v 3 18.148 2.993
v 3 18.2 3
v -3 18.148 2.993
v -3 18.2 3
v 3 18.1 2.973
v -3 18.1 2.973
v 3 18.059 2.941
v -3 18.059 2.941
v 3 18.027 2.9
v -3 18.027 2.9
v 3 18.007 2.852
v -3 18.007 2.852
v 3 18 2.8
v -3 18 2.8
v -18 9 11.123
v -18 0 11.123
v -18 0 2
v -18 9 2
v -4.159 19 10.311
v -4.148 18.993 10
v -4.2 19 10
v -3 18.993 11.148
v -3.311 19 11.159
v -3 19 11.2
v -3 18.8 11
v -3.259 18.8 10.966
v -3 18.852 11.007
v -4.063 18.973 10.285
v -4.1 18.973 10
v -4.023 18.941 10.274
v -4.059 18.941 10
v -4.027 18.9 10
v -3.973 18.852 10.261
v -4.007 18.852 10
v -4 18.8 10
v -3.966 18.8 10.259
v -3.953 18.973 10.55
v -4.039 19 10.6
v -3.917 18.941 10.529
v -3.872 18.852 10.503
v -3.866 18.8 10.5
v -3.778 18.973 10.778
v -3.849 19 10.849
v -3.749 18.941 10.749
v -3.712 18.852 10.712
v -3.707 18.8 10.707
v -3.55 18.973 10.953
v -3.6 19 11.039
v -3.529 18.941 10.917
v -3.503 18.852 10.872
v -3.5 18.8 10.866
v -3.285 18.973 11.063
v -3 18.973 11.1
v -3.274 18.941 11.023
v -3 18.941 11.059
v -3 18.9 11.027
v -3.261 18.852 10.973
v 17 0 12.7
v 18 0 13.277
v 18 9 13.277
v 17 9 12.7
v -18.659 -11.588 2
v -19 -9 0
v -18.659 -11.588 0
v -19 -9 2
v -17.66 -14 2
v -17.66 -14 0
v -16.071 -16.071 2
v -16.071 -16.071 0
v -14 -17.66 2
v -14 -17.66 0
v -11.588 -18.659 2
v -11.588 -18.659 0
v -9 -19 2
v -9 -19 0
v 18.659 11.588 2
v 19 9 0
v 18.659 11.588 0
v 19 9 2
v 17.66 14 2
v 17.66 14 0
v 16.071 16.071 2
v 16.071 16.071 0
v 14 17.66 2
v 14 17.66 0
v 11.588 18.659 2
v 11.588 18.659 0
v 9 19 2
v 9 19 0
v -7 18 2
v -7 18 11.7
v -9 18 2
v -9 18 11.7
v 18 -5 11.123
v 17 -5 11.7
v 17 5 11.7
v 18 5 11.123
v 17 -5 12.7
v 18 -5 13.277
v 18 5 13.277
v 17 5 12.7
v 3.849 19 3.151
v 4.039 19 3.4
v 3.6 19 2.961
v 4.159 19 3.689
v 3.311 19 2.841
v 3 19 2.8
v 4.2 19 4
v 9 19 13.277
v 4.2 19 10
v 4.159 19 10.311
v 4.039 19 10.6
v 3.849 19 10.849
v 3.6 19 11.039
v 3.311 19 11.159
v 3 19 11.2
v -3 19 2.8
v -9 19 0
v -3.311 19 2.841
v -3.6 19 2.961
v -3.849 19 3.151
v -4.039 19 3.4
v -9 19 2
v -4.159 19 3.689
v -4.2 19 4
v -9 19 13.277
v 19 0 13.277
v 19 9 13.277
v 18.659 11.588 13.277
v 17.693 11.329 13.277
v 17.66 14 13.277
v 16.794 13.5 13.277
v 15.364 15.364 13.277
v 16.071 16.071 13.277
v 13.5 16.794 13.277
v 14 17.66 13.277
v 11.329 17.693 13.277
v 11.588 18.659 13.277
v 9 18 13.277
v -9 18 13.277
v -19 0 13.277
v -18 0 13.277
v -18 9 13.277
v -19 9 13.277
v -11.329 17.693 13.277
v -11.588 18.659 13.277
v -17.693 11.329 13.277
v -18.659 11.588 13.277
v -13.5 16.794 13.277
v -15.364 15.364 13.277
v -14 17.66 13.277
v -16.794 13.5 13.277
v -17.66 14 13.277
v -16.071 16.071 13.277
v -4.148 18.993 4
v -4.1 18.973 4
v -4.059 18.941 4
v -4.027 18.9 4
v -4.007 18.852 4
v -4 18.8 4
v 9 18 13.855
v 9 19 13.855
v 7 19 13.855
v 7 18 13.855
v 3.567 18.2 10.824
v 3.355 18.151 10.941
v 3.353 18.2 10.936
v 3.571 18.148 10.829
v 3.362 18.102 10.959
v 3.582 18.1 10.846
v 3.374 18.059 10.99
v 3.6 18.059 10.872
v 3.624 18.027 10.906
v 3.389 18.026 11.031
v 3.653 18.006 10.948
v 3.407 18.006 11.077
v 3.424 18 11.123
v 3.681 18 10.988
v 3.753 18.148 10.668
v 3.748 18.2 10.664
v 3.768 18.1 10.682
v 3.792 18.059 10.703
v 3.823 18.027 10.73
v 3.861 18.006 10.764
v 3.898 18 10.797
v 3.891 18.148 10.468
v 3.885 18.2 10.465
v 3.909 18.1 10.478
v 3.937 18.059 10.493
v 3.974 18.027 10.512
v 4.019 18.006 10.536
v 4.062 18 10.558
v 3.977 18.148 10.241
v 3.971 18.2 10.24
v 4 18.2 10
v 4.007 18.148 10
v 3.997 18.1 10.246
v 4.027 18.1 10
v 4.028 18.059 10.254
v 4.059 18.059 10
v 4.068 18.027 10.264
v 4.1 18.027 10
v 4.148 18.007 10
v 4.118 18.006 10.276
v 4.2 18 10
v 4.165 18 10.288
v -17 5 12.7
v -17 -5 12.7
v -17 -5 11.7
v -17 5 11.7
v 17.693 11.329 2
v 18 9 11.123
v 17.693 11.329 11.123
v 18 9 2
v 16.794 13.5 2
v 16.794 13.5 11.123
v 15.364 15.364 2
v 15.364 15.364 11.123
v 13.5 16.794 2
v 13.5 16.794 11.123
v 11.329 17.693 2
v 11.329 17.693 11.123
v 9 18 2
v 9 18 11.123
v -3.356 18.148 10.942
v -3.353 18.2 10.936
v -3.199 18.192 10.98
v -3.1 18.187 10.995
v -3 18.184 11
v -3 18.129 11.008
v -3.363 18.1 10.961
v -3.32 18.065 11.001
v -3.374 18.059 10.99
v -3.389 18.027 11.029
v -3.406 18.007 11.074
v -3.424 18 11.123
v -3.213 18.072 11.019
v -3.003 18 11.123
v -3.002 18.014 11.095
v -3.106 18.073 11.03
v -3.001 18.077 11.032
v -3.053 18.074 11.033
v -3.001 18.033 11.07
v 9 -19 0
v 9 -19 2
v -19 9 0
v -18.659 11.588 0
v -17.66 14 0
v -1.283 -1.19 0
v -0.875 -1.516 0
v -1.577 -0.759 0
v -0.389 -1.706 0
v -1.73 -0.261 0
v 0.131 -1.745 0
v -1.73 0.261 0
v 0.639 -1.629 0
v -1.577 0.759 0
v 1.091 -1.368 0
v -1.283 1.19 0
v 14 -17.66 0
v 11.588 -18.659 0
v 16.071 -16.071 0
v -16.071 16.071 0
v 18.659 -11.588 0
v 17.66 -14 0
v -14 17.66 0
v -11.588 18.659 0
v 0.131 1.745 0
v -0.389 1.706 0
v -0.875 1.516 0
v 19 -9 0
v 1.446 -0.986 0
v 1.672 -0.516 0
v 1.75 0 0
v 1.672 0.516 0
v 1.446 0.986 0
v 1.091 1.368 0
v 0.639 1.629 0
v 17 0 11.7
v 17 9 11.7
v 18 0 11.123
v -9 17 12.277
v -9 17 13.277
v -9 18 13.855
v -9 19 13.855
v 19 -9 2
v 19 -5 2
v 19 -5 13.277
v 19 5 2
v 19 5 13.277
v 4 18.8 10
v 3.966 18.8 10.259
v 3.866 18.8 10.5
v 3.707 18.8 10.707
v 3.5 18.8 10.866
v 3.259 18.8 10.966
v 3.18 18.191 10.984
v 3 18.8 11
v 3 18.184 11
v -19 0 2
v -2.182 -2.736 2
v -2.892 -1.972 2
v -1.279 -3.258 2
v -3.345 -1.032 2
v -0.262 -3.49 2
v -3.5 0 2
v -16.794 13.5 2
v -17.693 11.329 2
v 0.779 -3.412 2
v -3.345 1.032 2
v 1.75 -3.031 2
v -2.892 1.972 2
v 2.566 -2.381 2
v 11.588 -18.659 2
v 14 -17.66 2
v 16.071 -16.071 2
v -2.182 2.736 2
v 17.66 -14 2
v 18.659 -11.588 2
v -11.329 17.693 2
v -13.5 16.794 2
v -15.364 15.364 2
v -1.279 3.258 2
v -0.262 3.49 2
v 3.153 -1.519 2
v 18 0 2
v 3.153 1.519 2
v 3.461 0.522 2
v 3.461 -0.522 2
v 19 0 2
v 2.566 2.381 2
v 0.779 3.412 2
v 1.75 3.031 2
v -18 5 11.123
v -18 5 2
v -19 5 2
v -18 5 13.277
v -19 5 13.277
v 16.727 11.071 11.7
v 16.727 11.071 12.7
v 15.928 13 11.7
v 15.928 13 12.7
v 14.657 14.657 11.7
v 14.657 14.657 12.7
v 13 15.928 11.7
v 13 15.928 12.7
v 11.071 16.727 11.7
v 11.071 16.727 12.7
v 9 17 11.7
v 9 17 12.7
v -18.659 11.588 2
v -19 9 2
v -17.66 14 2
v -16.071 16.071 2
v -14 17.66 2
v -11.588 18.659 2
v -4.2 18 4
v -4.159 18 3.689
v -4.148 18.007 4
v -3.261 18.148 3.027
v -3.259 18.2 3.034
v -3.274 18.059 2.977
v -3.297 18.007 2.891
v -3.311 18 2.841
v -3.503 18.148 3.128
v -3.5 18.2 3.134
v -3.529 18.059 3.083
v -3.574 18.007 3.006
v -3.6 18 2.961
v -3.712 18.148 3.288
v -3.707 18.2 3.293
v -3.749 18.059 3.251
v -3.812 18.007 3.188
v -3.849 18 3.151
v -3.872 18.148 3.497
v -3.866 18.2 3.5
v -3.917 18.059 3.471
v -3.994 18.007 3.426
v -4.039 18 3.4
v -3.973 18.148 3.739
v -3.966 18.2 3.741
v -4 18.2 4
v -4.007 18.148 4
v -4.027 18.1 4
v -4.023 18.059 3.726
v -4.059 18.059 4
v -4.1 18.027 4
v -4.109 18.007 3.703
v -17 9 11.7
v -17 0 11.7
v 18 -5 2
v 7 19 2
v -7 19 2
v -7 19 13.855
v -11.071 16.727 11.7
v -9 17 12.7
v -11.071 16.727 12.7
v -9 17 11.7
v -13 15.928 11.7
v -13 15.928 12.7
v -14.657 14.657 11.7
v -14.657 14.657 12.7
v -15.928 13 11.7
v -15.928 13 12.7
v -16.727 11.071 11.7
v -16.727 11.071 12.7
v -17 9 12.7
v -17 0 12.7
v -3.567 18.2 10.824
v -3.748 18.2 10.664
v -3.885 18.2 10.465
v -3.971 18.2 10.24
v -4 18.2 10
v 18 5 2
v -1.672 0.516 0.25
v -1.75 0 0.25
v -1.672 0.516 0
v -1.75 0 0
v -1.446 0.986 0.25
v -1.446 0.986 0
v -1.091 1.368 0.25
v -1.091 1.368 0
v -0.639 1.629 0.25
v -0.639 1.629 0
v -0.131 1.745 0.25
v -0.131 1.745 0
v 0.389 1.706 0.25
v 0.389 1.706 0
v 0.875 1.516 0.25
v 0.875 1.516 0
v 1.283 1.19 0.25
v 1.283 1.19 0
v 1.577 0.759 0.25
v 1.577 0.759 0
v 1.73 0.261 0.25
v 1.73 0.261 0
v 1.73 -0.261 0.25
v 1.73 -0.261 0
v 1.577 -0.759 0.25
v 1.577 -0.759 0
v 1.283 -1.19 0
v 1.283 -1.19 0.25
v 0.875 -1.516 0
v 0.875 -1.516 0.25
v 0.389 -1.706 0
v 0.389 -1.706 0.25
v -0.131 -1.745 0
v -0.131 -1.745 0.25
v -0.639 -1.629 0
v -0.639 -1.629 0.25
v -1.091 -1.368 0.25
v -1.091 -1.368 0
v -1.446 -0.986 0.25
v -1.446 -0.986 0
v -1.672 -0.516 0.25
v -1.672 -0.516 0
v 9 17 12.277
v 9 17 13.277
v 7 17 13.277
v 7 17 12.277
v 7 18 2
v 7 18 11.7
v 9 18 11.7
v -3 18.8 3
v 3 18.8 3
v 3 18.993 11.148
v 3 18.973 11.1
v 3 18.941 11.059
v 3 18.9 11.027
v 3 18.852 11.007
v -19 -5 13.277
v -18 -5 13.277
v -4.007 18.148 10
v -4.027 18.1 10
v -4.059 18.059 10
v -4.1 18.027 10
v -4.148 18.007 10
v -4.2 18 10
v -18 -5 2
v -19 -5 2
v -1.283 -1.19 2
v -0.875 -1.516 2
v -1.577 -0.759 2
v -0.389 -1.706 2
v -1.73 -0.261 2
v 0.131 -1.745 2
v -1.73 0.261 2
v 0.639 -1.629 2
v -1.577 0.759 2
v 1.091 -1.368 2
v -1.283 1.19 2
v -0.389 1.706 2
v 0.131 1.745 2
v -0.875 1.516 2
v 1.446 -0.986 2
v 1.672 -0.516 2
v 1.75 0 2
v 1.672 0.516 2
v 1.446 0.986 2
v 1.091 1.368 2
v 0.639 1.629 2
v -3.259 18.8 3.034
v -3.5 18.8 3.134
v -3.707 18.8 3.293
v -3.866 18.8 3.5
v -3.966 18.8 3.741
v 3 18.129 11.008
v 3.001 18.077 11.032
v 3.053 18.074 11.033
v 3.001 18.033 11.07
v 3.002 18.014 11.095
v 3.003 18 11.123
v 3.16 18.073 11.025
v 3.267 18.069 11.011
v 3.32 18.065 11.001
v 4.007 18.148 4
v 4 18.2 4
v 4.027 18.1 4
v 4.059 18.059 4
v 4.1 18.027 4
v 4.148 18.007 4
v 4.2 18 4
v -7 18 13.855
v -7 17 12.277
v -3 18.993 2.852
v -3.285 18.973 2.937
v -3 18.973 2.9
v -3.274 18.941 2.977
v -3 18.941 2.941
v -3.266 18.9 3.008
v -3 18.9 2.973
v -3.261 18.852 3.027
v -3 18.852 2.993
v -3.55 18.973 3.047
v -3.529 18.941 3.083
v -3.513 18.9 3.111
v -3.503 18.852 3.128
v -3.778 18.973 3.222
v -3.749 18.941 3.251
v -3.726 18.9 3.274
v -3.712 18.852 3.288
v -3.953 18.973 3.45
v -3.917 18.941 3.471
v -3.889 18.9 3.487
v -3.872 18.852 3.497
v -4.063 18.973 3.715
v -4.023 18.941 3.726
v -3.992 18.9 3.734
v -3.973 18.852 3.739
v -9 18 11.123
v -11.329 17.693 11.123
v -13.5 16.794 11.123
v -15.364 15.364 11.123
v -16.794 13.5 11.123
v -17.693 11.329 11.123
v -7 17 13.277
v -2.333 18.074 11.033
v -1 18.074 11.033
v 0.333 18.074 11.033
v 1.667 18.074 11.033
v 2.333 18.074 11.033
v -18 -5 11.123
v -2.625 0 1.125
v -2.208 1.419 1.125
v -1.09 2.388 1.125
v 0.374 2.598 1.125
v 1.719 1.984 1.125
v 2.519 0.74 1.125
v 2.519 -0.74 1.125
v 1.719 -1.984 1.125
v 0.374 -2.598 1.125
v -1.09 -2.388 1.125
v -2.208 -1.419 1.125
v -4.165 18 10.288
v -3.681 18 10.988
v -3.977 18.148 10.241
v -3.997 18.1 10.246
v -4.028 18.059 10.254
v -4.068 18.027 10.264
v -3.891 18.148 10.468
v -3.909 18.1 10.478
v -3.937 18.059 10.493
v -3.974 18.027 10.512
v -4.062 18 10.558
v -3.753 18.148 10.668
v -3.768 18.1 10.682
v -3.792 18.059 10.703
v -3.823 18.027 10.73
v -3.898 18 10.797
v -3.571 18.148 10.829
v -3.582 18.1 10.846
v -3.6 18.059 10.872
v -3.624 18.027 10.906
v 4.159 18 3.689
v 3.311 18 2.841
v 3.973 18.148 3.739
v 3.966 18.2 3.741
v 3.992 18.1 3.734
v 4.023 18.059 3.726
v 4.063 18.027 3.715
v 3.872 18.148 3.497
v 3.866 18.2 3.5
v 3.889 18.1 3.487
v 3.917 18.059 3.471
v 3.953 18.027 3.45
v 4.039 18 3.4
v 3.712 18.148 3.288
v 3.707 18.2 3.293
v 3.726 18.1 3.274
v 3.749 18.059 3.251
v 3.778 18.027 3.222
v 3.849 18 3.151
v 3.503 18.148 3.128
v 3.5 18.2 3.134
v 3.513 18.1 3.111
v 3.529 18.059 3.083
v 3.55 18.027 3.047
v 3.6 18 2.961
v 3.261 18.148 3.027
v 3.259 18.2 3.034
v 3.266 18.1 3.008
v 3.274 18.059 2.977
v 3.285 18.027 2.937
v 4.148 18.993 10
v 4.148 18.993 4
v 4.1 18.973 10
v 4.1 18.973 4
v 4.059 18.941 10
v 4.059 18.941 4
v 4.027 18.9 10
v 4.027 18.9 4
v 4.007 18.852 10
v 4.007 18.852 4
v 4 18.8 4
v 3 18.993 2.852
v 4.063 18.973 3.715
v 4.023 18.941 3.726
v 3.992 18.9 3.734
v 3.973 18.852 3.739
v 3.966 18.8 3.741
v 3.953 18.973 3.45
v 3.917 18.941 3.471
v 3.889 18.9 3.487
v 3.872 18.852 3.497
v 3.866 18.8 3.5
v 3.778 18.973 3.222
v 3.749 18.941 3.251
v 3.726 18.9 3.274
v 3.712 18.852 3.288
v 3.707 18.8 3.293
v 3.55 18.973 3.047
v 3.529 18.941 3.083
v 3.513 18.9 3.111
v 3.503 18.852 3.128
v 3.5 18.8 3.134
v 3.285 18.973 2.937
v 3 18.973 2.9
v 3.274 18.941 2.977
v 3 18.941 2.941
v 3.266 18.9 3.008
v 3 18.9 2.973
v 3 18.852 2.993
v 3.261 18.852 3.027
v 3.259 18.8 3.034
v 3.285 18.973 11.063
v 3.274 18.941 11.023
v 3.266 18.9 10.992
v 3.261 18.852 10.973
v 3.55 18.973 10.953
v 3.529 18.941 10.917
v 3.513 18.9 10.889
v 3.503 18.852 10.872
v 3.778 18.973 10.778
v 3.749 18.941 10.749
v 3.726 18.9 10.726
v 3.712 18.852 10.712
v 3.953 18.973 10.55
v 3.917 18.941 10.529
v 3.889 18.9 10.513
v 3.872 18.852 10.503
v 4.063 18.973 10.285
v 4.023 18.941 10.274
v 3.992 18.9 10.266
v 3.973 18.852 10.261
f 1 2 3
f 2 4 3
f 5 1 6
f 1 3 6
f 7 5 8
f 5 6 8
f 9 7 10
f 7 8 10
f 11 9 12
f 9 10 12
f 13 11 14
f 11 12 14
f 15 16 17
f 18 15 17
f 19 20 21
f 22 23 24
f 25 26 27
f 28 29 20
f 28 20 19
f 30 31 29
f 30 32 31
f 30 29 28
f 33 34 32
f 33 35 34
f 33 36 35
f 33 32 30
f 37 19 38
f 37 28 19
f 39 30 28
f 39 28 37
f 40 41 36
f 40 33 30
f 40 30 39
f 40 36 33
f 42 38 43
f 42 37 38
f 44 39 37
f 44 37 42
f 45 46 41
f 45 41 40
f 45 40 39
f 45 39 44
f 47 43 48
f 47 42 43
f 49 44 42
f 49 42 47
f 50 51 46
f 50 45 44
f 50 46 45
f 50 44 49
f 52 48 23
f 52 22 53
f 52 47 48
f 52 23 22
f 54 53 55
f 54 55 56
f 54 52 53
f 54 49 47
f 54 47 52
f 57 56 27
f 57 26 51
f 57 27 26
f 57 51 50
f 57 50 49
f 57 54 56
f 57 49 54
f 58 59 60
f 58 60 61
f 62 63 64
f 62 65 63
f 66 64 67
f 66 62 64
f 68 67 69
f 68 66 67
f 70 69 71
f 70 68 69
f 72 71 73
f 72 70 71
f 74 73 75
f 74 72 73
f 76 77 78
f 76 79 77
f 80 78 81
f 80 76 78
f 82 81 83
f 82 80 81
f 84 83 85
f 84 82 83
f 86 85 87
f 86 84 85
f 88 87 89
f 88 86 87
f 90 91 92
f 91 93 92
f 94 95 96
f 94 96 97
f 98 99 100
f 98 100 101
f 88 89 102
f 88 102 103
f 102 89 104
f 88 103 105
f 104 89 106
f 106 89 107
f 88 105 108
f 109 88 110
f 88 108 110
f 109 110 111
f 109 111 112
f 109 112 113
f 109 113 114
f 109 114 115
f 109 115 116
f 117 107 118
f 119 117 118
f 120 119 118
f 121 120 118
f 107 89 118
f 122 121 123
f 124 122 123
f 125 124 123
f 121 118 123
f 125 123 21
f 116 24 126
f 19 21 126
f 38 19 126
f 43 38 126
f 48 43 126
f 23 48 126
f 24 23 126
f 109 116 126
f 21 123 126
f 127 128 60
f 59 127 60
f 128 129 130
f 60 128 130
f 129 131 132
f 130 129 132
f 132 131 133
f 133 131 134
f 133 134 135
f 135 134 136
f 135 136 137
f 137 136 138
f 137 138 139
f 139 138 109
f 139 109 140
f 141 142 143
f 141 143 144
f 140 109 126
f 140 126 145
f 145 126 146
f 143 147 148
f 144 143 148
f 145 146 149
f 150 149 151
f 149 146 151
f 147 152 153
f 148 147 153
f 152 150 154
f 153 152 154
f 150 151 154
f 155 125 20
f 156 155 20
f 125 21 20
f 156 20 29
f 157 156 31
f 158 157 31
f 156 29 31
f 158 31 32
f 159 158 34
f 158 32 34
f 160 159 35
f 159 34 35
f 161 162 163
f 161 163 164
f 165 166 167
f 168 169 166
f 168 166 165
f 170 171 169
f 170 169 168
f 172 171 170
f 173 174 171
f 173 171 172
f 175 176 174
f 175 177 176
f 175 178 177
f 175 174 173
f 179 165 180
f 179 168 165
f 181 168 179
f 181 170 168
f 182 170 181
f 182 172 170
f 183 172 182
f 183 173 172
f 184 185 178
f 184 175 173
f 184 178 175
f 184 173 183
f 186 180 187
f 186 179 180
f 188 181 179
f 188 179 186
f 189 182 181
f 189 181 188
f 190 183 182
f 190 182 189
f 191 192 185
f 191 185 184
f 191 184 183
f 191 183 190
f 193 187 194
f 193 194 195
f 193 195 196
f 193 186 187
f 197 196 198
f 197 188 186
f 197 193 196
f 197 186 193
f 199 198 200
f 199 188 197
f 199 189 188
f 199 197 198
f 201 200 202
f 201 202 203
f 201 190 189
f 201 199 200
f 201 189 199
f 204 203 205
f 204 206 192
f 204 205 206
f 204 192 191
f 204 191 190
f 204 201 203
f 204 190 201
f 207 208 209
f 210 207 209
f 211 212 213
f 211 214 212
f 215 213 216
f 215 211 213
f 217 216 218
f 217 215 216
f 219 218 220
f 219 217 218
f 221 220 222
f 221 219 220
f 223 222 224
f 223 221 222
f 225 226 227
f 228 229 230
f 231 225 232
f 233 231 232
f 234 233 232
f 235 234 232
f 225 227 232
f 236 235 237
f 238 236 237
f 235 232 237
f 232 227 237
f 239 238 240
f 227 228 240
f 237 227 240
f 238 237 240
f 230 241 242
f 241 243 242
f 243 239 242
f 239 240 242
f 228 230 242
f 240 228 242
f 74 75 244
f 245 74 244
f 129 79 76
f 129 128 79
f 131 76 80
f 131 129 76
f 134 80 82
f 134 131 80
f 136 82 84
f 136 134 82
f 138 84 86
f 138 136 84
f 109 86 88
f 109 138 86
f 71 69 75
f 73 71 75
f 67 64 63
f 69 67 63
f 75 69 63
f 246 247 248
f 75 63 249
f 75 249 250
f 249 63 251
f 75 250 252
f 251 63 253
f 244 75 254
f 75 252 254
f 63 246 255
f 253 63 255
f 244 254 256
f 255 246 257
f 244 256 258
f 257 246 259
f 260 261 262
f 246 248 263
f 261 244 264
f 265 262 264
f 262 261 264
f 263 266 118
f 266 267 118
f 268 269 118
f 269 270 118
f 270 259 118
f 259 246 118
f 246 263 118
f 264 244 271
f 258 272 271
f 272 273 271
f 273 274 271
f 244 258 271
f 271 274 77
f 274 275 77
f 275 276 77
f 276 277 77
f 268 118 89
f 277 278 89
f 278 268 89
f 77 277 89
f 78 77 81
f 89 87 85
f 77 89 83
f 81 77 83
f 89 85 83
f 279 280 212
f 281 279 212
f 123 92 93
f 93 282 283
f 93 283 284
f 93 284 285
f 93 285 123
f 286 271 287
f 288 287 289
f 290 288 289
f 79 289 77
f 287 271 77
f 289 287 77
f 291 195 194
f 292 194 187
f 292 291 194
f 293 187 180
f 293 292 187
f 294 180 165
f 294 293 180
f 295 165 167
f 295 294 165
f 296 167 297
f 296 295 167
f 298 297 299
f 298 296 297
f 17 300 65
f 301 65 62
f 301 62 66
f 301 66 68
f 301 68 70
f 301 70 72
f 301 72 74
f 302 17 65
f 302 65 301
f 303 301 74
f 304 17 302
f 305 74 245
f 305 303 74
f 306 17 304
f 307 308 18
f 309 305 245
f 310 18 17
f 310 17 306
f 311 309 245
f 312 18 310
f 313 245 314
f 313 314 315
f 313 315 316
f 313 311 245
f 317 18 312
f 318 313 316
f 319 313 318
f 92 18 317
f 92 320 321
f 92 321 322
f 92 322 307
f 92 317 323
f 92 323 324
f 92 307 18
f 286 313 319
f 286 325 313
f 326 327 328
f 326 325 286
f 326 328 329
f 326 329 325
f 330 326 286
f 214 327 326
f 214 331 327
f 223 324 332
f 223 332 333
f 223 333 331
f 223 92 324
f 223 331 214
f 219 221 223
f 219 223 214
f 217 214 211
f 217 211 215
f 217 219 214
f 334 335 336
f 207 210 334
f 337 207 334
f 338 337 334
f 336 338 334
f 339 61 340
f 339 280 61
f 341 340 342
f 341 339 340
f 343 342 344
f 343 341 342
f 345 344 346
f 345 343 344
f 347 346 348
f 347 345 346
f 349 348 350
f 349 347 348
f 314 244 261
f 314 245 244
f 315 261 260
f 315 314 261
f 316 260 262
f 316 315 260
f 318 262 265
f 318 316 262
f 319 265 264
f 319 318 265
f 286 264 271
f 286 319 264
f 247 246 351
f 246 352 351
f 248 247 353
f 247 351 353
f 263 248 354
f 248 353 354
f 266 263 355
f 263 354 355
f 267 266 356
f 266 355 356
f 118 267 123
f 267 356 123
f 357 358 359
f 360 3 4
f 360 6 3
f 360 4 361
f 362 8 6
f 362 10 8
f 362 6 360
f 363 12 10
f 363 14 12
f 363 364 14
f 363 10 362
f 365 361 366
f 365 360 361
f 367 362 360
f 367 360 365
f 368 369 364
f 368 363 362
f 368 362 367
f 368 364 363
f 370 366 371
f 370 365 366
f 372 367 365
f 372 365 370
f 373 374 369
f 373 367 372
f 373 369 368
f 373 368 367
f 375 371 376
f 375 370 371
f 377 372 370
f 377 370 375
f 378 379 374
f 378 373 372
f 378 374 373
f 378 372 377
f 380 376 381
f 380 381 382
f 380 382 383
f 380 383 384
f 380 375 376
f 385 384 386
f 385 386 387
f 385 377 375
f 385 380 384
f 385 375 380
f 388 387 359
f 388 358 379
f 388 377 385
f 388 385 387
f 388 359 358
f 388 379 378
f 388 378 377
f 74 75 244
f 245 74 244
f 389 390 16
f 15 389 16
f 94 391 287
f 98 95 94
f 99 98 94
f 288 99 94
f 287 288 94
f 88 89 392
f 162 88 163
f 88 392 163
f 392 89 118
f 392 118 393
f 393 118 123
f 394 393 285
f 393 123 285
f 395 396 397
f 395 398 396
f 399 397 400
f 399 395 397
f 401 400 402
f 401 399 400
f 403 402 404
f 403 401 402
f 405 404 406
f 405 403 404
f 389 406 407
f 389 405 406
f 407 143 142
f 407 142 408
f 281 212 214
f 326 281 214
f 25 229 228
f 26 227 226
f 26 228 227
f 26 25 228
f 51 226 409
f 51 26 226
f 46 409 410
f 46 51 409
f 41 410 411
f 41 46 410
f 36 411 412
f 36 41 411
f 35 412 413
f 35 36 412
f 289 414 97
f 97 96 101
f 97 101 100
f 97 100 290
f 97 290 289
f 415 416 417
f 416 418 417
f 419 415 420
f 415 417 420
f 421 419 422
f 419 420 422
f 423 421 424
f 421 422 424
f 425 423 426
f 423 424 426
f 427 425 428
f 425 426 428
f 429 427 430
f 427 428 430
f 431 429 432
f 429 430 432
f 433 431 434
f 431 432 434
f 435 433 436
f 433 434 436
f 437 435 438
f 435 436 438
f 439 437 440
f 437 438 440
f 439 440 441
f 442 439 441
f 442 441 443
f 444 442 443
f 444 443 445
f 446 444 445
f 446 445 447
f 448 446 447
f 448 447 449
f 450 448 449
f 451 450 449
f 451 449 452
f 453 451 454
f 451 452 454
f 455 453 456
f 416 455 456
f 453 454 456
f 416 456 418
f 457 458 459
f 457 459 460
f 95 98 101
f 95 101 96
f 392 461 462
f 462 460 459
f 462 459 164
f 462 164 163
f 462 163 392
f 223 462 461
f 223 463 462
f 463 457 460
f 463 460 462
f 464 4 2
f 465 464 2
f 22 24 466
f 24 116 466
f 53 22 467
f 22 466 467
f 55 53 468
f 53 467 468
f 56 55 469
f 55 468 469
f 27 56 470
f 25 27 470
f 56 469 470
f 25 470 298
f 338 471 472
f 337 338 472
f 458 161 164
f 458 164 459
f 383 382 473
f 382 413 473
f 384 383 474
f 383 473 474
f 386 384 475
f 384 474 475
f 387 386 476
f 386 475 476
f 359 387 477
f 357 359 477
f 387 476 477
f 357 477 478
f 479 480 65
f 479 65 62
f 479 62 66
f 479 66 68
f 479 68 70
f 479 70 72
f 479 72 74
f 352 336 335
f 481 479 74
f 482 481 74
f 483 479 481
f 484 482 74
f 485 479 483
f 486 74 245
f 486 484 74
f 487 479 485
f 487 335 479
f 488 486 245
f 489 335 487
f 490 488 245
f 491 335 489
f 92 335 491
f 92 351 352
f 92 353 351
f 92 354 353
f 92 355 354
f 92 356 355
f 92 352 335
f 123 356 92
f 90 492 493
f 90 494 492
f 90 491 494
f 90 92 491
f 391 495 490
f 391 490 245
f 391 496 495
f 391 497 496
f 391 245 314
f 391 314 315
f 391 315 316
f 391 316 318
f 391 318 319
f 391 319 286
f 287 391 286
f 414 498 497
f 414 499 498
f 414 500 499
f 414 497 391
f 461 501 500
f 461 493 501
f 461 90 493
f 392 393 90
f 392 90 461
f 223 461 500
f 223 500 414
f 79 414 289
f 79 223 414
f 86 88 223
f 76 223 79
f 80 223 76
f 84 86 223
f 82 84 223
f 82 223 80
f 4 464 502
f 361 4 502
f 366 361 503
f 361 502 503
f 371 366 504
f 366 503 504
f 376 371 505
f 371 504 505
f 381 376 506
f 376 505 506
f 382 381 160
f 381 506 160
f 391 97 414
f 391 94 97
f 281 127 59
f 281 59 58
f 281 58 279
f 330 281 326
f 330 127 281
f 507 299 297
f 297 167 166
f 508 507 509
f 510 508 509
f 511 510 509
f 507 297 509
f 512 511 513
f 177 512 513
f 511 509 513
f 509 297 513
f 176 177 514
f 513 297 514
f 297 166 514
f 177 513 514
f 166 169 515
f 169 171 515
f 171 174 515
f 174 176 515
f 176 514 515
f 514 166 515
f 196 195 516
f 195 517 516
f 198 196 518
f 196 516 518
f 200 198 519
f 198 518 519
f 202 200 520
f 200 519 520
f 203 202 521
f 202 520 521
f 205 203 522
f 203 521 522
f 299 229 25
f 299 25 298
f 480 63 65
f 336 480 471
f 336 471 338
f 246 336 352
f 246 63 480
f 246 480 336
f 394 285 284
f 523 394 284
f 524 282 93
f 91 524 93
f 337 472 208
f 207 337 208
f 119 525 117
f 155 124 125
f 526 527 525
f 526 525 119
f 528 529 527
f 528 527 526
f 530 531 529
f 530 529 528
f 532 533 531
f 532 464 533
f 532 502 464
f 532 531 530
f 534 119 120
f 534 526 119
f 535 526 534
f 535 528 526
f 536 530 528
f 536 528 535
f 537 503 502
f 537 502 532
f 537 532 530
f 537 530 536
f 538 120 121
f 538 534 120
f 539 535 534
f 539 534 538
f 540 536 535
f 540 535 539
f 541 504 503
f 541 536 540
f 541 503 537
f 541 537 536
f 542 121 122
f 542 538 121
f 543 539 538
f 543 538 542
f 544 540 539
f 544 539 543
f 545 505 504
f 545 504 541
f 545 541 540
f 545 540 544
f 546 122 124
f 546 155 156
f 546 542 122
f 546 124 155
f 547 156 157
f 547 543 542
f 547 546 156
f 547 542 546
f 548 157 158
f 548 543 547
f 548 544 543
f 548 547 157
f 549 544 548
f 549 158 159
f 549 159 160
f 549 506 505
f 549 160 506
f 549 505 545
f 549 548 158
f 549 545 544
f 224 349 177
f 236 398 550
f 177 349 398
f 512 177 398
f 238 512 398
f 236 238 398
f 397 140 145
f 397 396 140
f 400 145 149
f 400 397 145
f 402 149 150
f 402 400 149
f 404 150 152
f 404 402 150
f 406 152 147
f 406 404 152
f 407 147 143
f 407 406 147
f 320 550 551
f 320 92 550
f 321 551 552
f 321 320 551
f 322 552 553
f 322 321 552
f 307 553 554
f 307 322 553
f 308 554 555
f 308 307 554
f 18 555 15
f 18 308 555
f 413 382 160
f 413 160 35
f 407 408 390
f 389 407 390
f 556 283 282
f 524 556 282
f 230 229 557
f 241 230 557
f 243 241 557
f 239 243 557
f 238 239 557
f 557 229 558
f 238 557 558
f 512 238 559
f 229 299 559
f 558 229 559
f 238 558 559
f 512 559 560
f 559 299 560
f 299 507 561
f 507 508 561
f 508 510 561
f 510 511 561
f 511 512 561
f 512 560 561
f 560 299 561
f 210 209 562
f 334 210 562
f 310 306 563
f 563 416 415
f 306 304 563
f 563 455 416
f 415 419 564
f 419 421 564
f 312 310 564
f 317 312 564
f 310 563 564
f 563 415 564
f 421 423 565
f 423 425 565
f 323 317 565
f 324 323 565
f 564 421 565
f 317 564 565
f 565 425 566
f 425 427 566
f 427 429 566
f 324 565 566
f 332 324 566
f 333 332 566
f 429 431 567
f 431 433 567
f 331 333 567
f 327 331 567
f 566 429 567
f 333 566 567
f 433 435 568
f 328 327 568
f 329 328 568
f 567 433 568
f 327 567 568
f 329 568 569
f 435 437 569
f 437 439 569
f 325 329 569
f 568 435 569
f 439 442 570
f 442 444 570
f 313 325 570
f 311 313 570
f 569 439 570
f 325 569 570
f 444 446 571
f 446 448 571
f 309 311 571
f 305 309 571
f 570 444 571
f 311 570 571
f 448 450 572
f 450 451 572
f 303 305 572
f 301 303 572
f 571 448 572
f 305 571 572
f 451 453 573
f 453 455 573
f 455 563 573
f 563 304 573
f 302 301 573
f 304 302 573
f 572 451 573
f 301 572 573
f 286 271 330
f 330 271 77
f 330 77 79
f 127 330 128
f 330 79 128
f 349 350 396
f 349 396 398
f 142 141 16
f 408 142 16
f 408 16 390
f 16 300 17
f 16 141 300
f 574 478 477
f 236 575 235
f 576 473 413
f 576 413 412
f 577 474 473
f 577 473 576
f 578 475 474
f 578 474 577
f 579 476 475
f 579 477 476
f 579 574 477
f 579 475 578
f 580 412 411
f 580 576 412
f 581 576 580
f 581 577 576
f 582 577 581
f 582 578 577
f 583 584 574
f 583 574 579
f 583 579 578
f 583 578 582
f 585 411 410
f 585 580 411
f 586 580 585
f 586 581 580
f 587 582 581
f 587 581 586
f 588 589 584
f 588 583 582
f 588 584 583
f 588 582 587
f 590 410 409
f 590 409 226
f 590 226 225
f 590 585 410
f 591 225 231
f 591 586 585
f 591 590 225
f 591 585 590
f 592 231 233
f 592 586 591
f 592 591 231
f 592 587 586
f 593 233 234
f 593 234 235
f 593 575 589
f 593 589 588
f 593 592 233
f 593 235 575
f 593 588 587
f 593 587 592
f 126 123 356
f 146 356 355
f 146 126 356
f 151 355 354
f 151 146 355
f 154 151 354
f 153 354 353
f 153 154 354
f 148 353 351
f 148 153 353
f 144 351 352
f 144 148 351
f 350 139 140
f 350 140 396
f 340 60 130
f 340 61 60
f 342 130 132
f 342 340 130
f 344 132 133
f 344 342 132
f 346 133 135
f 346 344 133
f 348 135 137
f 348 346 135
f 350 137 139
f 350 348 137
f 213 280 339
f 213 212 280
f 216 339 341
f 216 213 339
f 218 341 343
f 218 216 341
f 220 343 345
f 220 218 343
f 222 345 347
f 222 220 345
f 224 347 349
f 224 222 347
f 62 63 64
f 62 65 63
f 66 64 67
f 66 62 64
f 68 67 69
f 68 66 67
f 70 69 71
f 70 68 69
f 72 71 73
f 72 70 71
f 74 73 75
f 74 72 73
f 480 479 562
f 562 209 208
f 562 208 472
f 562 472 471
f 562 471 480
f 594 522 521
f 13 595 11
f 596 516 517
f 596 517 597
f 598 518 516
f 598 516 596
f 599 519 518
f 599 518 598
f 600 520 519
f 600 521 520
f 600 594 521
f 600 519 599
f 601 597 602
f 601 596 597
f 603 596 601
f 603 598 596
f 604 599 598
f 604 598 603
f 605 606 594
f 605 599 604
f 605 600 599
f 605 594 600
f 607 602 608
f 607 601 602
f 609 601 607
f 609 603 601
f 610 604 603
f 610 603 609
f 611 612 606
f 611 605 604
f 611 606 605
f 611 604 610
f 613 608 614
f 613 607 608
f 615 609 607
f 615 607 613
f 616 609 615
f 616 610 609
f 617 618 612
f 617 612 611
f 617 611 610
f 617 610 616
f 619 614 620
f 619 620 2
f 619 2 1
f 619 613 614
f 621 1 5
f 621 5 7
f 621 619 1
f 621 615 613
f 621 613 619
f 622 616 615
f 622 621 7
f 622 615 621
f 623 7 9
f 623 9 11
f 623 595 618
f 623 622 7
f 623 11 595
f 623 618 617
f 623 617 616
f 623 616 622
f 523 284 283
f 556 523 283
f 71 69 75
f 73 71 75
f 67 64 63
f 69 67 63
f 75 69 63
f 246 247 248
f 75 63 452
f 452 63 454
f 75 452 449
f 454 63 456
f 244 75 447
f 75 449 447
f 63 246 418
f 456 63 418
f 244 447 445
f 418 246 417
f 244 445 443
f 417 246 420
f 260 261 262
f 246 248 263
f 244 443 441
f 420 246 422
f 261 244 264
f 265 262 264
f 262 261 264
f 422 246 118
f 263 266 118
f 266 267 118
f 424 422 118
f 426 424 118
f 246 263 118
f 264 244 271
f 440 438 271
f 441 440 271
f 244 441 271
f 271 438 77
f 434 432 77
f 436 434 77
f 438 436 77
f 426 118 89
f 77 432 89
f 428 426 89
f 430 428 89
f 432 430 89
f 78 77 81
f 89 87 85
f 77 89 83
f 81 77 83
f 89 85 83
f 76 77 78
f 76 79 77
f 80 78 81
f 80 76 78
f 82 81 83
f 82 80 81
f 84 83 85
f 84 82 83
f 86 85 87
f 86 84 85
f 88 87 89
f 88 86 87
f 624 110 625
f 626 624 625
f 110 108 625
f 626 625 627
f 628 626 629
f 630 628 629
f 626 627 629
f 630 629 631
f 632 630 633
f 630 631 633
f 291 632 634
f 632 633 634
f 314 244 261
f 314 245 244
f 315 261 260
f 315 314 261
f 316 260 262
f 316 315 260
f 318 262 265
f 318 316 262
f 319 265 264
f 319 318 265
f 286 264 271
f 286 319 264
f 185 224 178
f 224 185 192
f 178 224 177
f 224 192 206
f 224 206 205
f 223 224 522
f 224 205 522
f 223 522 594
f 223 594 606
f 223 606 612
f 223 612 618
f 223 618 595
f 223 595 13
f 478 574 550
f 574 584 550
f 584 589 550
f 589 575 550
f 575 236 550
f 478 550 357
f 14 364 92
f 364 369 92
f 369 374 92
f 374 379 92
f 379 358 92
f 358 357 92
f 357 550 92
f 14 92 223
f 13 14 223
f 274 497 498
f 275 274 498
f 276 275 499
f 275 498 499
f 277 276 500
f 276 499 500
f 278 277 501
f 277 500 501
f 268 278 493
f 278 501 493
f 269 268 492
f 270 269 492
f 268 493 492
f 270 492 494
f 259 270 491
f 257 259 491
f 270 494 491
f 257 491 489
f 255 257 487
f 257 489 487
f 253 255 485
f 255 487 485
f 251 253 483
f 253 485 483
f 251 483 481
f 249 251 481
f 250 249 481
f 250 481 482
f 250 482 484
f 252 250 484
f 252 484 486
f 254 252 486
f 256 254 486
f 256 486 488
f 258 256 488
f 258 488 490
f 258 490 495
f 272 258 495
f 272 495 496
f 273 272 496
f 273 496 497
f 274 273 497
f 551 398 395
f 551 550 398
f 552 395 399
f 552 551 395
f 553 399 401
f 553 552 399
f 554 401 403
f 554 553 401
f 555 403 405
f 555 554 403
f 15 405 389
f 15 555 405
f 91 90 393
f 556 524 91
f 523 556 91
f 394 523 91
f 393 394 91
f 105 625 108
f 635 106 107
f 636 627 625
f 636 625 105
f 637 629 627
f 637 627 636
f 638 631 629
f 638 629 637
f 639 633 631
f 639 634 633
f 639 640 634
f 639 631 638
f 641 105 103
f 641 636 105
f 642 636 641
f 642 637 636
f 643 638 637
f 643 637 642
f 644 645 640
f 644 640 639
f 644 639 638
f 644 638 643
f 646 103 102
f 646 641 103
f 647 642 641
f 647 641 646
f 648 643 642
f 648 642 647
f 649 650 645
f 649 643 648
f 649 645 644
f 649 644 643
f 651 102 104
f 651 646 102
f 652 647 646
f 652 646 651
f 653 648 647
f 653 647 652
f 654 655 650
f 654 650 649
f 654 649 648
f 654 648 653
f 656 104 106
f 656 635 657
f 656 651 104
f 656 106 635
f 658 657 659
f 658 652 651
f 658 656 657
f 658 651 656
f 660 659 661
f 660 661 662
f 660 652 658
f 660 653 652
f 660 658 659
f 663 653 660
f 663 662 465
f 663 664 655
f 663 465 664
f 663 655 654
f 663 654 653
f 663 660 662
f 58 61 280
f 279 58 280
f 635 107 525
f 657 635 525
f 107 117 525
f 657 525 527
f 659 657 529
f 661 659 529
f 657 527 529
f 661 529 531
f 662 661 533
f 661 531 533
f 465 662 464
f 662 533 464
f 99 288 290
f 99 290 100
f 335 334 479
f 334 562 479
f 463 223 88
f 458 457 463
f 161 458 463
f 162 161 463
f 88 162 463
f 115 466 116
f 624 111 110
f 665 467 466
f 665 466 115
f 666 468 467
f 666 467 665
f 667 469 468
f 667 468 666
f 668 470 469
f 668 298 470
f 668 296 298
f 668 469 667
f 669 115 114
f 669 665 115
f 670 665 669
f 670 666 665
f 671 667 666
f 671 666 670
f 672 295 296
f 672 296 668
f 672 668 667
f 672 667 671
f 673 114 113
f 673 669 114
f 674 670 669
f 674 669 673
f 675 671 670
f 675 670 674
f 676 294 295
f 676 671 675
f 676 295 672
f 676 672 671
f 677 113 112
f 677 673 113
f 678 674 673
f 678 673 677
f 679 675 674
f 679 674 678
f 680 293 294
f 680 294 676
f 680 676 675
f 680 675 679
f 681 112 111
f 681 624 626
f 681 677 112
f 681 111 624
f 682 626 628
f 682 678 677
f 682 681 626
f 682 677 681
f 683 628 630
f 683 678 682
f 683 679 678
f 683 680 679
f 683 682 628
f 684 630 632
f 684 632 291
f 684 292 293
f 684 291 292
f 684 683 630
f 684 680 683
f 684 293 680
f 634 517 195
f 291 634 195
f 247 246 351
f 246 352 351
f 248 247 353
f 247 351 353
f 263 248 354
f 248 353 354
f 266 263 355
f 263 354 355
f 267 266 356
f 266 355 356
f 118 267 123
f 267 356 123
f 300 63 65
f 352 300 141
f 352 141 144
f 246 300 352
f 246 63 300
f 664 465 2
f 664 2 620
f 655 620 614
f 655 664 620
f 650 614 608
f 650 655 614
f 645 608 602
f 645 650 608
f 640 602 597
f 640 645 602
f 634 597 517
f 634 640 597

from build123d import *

# Parameters (mm, degrees)
SKETCH_W            = 38
SKETCH_H            = 38
PAD_DEPTH           = 2
FILLET_R            = 10
PAD001_DEPTH        = 5
SKETCH002_R         = 1.75
HOLE_DEPTH          = 4.125
PAD002_DEPTH        = 1
SKETCH006_W         = 38
SKETCH006_H         = 38
PAD005_DEPTH        = 2
FILLET001_R         = 10
HOLE001_D           = 3.5
HOLE001_DEPTH       = 4.13
HOLE001_CSINK_D     = 7
HOLE001_CSINK_ANGLE = 90
SKETCH009_W         = 8
SKETCH009_H         = 8
POCKET_DEPTH        = 1.001
FILLET002_R         = 1
FILLET003_R         = 0.2


with BuildPart() as body:
    # Sketch → Pad (new body)
    with BuildSketch(Plane.XY):
        Rectangle(SKETCH_W, SKETCH_H)
    extrude(amount=PAD_DEPTH)

    # Fillet
    fillet_edges = [body.edges().sort_by_distance(p)[0] for p in [
        (19, -19, 1),
        (-19, -19, 1),
        (19, 19, 1),
        (-19, 19, 1),
    ]]
    fillet(fillet_edges, radius=FILLET_R)

    # Sketch001 → Pad001 (join, symmetric)
    with BuildSketch(Plane.XZ):
        Polygon((19, 2), (19, 13.27735), (18, 13.27735), (17, 12.7), (17, 11.7), (18, 11.12265), (18, 2), align=None)
    pad001 = extrude(amount=PAD001_DEPTH, both=True)

    # Mirrored: Pad001 across YZ
    add(pad001.mirror(Plane.YZ))

    # Sketch002 (on Face5 of Mirrored) → Hole (cut)
    with BuildSketch(Plane.XY.offset(2)):
        Circle(SKETCH002_R)
    extrude(amount=-HOLE_DEPTH, mode=Mode.SUBTRACT)

    # Sketch003 (on DatumPlane) → Pad002 (join, symmetric)
    with BuildSketch(Plane.YZ.offset(8)):
        Polygon((19, 2), (19, 13.854701), (18, 13.854701), (17, 13.27735), (17, 12.27735), (18, 11.7), (18, 2), align=None)
    pad002 = extrude(amount=PAD002_DEPTH, both=True)

    # Mirrored001: Pad002 across YZ
    add(pad002.mirror(Plane.YZ))


with BuildPart() as body001:
    # Sketch006 → Pad005 (new body)
    with BuildSketch(Plane.XY):
        Rectangle(SKETCH006_W, SKETCH006_H)
    extrude(amount=PAD005_DEPTH)

    # Fillet001
    fillet001_edges = [body001.edges().sort_by_distance(p)[0] for p in [
        (19, -19, 1),
        (-19, -19, 1),
        (19, 19, 1),
        (-19, 19, 1),
    ]]
    fillet(fillet001_edges, radius=FILLET001_R)

    # AdditivePipe: sweep along a path in Sketch007
    with BuildLine(Plane.XY.offset(2)) as additivepipe_path:
        Line((19, 0), (19, 9))
        ThreePointArc((19, 9), (16.071068, 16.071068), (9, 19))
        Line((9, 19), (-9, 19))
        ThreePointArc((-9, 19), (-16.071068, 16.071068), (-19, 9))
        Line((-19, 9), (-19, 0))
    # Sketch004 → AdditivePipe (sweep)
    with BuildSketch(Plane.XZ):
        Polygon((19, 2), (19, 13.27735), (18, 13.27735), (17, 12.7), (17, 11.7), (18, 11.12265), (18, 2), align=None)
    sweep(path=additivepipe_path.line)

    # Hole001
    with Locations(Plane.XY.offset(2)):
        with Locations((0, 0)):
            CounterSinkHole(HOLE001_D / 2, HOLE001_CSINK_D / 2, depth=HOLE001_DEPTH, counter_sink_angle=HOLE001_CSINK_ANGLE)

    # Sketch009 (on Face17 of Hole001) → Pocket (cut, through all)
    with BuildSketch(Plane.XZ.offset(-18)):
        with Locations((0, 7)):
            Rectangle(SKETCH009_W, SKETCH009_H)
    extrude(amount=-POCKET_DEPTH, mode=Mode.SUBTRACT)

    # Fillet002
    fillet002_edges = [body001.edges().sort_by_distance(p)[0] for p in [
        (4, 18.5, 3),
        (-4, 18.5, 3),
        (4, 18.5, 11),
        (-4, 18.5, 11),
    ]]
    fillet(fillet002_edges, radius=FILLET002_R)

    # Fillet003
    fillet003_edges = [body001.edges().sort_by_distance(p)[0] for p in [
        (-4, 18, 7),
        (-3.707107, 18, 10.707107),
        (0, 18, 11),
        (3.707107, 18, 10.707107),
        (4, 18, 7),
        (3.707107, 18, 3.292893),
        (0, 18, 3),
        (-3.707107, 18, 3.292893),
        (0, 19, 11),
        (-3.707107, 19, 10.707107),
        (-4, 19, 7),
        (-3.707107, 19, 3.292893),
        (0, 19, 3),
        (3.707107, 19, 3.292893),
        (4, 19, 7),
        (3.707107, 19, 10.707107),
    ]]
    fillet(fillet003_edges, radius=FILLET003_R)


solid = Compound([body.part, body001.part])
